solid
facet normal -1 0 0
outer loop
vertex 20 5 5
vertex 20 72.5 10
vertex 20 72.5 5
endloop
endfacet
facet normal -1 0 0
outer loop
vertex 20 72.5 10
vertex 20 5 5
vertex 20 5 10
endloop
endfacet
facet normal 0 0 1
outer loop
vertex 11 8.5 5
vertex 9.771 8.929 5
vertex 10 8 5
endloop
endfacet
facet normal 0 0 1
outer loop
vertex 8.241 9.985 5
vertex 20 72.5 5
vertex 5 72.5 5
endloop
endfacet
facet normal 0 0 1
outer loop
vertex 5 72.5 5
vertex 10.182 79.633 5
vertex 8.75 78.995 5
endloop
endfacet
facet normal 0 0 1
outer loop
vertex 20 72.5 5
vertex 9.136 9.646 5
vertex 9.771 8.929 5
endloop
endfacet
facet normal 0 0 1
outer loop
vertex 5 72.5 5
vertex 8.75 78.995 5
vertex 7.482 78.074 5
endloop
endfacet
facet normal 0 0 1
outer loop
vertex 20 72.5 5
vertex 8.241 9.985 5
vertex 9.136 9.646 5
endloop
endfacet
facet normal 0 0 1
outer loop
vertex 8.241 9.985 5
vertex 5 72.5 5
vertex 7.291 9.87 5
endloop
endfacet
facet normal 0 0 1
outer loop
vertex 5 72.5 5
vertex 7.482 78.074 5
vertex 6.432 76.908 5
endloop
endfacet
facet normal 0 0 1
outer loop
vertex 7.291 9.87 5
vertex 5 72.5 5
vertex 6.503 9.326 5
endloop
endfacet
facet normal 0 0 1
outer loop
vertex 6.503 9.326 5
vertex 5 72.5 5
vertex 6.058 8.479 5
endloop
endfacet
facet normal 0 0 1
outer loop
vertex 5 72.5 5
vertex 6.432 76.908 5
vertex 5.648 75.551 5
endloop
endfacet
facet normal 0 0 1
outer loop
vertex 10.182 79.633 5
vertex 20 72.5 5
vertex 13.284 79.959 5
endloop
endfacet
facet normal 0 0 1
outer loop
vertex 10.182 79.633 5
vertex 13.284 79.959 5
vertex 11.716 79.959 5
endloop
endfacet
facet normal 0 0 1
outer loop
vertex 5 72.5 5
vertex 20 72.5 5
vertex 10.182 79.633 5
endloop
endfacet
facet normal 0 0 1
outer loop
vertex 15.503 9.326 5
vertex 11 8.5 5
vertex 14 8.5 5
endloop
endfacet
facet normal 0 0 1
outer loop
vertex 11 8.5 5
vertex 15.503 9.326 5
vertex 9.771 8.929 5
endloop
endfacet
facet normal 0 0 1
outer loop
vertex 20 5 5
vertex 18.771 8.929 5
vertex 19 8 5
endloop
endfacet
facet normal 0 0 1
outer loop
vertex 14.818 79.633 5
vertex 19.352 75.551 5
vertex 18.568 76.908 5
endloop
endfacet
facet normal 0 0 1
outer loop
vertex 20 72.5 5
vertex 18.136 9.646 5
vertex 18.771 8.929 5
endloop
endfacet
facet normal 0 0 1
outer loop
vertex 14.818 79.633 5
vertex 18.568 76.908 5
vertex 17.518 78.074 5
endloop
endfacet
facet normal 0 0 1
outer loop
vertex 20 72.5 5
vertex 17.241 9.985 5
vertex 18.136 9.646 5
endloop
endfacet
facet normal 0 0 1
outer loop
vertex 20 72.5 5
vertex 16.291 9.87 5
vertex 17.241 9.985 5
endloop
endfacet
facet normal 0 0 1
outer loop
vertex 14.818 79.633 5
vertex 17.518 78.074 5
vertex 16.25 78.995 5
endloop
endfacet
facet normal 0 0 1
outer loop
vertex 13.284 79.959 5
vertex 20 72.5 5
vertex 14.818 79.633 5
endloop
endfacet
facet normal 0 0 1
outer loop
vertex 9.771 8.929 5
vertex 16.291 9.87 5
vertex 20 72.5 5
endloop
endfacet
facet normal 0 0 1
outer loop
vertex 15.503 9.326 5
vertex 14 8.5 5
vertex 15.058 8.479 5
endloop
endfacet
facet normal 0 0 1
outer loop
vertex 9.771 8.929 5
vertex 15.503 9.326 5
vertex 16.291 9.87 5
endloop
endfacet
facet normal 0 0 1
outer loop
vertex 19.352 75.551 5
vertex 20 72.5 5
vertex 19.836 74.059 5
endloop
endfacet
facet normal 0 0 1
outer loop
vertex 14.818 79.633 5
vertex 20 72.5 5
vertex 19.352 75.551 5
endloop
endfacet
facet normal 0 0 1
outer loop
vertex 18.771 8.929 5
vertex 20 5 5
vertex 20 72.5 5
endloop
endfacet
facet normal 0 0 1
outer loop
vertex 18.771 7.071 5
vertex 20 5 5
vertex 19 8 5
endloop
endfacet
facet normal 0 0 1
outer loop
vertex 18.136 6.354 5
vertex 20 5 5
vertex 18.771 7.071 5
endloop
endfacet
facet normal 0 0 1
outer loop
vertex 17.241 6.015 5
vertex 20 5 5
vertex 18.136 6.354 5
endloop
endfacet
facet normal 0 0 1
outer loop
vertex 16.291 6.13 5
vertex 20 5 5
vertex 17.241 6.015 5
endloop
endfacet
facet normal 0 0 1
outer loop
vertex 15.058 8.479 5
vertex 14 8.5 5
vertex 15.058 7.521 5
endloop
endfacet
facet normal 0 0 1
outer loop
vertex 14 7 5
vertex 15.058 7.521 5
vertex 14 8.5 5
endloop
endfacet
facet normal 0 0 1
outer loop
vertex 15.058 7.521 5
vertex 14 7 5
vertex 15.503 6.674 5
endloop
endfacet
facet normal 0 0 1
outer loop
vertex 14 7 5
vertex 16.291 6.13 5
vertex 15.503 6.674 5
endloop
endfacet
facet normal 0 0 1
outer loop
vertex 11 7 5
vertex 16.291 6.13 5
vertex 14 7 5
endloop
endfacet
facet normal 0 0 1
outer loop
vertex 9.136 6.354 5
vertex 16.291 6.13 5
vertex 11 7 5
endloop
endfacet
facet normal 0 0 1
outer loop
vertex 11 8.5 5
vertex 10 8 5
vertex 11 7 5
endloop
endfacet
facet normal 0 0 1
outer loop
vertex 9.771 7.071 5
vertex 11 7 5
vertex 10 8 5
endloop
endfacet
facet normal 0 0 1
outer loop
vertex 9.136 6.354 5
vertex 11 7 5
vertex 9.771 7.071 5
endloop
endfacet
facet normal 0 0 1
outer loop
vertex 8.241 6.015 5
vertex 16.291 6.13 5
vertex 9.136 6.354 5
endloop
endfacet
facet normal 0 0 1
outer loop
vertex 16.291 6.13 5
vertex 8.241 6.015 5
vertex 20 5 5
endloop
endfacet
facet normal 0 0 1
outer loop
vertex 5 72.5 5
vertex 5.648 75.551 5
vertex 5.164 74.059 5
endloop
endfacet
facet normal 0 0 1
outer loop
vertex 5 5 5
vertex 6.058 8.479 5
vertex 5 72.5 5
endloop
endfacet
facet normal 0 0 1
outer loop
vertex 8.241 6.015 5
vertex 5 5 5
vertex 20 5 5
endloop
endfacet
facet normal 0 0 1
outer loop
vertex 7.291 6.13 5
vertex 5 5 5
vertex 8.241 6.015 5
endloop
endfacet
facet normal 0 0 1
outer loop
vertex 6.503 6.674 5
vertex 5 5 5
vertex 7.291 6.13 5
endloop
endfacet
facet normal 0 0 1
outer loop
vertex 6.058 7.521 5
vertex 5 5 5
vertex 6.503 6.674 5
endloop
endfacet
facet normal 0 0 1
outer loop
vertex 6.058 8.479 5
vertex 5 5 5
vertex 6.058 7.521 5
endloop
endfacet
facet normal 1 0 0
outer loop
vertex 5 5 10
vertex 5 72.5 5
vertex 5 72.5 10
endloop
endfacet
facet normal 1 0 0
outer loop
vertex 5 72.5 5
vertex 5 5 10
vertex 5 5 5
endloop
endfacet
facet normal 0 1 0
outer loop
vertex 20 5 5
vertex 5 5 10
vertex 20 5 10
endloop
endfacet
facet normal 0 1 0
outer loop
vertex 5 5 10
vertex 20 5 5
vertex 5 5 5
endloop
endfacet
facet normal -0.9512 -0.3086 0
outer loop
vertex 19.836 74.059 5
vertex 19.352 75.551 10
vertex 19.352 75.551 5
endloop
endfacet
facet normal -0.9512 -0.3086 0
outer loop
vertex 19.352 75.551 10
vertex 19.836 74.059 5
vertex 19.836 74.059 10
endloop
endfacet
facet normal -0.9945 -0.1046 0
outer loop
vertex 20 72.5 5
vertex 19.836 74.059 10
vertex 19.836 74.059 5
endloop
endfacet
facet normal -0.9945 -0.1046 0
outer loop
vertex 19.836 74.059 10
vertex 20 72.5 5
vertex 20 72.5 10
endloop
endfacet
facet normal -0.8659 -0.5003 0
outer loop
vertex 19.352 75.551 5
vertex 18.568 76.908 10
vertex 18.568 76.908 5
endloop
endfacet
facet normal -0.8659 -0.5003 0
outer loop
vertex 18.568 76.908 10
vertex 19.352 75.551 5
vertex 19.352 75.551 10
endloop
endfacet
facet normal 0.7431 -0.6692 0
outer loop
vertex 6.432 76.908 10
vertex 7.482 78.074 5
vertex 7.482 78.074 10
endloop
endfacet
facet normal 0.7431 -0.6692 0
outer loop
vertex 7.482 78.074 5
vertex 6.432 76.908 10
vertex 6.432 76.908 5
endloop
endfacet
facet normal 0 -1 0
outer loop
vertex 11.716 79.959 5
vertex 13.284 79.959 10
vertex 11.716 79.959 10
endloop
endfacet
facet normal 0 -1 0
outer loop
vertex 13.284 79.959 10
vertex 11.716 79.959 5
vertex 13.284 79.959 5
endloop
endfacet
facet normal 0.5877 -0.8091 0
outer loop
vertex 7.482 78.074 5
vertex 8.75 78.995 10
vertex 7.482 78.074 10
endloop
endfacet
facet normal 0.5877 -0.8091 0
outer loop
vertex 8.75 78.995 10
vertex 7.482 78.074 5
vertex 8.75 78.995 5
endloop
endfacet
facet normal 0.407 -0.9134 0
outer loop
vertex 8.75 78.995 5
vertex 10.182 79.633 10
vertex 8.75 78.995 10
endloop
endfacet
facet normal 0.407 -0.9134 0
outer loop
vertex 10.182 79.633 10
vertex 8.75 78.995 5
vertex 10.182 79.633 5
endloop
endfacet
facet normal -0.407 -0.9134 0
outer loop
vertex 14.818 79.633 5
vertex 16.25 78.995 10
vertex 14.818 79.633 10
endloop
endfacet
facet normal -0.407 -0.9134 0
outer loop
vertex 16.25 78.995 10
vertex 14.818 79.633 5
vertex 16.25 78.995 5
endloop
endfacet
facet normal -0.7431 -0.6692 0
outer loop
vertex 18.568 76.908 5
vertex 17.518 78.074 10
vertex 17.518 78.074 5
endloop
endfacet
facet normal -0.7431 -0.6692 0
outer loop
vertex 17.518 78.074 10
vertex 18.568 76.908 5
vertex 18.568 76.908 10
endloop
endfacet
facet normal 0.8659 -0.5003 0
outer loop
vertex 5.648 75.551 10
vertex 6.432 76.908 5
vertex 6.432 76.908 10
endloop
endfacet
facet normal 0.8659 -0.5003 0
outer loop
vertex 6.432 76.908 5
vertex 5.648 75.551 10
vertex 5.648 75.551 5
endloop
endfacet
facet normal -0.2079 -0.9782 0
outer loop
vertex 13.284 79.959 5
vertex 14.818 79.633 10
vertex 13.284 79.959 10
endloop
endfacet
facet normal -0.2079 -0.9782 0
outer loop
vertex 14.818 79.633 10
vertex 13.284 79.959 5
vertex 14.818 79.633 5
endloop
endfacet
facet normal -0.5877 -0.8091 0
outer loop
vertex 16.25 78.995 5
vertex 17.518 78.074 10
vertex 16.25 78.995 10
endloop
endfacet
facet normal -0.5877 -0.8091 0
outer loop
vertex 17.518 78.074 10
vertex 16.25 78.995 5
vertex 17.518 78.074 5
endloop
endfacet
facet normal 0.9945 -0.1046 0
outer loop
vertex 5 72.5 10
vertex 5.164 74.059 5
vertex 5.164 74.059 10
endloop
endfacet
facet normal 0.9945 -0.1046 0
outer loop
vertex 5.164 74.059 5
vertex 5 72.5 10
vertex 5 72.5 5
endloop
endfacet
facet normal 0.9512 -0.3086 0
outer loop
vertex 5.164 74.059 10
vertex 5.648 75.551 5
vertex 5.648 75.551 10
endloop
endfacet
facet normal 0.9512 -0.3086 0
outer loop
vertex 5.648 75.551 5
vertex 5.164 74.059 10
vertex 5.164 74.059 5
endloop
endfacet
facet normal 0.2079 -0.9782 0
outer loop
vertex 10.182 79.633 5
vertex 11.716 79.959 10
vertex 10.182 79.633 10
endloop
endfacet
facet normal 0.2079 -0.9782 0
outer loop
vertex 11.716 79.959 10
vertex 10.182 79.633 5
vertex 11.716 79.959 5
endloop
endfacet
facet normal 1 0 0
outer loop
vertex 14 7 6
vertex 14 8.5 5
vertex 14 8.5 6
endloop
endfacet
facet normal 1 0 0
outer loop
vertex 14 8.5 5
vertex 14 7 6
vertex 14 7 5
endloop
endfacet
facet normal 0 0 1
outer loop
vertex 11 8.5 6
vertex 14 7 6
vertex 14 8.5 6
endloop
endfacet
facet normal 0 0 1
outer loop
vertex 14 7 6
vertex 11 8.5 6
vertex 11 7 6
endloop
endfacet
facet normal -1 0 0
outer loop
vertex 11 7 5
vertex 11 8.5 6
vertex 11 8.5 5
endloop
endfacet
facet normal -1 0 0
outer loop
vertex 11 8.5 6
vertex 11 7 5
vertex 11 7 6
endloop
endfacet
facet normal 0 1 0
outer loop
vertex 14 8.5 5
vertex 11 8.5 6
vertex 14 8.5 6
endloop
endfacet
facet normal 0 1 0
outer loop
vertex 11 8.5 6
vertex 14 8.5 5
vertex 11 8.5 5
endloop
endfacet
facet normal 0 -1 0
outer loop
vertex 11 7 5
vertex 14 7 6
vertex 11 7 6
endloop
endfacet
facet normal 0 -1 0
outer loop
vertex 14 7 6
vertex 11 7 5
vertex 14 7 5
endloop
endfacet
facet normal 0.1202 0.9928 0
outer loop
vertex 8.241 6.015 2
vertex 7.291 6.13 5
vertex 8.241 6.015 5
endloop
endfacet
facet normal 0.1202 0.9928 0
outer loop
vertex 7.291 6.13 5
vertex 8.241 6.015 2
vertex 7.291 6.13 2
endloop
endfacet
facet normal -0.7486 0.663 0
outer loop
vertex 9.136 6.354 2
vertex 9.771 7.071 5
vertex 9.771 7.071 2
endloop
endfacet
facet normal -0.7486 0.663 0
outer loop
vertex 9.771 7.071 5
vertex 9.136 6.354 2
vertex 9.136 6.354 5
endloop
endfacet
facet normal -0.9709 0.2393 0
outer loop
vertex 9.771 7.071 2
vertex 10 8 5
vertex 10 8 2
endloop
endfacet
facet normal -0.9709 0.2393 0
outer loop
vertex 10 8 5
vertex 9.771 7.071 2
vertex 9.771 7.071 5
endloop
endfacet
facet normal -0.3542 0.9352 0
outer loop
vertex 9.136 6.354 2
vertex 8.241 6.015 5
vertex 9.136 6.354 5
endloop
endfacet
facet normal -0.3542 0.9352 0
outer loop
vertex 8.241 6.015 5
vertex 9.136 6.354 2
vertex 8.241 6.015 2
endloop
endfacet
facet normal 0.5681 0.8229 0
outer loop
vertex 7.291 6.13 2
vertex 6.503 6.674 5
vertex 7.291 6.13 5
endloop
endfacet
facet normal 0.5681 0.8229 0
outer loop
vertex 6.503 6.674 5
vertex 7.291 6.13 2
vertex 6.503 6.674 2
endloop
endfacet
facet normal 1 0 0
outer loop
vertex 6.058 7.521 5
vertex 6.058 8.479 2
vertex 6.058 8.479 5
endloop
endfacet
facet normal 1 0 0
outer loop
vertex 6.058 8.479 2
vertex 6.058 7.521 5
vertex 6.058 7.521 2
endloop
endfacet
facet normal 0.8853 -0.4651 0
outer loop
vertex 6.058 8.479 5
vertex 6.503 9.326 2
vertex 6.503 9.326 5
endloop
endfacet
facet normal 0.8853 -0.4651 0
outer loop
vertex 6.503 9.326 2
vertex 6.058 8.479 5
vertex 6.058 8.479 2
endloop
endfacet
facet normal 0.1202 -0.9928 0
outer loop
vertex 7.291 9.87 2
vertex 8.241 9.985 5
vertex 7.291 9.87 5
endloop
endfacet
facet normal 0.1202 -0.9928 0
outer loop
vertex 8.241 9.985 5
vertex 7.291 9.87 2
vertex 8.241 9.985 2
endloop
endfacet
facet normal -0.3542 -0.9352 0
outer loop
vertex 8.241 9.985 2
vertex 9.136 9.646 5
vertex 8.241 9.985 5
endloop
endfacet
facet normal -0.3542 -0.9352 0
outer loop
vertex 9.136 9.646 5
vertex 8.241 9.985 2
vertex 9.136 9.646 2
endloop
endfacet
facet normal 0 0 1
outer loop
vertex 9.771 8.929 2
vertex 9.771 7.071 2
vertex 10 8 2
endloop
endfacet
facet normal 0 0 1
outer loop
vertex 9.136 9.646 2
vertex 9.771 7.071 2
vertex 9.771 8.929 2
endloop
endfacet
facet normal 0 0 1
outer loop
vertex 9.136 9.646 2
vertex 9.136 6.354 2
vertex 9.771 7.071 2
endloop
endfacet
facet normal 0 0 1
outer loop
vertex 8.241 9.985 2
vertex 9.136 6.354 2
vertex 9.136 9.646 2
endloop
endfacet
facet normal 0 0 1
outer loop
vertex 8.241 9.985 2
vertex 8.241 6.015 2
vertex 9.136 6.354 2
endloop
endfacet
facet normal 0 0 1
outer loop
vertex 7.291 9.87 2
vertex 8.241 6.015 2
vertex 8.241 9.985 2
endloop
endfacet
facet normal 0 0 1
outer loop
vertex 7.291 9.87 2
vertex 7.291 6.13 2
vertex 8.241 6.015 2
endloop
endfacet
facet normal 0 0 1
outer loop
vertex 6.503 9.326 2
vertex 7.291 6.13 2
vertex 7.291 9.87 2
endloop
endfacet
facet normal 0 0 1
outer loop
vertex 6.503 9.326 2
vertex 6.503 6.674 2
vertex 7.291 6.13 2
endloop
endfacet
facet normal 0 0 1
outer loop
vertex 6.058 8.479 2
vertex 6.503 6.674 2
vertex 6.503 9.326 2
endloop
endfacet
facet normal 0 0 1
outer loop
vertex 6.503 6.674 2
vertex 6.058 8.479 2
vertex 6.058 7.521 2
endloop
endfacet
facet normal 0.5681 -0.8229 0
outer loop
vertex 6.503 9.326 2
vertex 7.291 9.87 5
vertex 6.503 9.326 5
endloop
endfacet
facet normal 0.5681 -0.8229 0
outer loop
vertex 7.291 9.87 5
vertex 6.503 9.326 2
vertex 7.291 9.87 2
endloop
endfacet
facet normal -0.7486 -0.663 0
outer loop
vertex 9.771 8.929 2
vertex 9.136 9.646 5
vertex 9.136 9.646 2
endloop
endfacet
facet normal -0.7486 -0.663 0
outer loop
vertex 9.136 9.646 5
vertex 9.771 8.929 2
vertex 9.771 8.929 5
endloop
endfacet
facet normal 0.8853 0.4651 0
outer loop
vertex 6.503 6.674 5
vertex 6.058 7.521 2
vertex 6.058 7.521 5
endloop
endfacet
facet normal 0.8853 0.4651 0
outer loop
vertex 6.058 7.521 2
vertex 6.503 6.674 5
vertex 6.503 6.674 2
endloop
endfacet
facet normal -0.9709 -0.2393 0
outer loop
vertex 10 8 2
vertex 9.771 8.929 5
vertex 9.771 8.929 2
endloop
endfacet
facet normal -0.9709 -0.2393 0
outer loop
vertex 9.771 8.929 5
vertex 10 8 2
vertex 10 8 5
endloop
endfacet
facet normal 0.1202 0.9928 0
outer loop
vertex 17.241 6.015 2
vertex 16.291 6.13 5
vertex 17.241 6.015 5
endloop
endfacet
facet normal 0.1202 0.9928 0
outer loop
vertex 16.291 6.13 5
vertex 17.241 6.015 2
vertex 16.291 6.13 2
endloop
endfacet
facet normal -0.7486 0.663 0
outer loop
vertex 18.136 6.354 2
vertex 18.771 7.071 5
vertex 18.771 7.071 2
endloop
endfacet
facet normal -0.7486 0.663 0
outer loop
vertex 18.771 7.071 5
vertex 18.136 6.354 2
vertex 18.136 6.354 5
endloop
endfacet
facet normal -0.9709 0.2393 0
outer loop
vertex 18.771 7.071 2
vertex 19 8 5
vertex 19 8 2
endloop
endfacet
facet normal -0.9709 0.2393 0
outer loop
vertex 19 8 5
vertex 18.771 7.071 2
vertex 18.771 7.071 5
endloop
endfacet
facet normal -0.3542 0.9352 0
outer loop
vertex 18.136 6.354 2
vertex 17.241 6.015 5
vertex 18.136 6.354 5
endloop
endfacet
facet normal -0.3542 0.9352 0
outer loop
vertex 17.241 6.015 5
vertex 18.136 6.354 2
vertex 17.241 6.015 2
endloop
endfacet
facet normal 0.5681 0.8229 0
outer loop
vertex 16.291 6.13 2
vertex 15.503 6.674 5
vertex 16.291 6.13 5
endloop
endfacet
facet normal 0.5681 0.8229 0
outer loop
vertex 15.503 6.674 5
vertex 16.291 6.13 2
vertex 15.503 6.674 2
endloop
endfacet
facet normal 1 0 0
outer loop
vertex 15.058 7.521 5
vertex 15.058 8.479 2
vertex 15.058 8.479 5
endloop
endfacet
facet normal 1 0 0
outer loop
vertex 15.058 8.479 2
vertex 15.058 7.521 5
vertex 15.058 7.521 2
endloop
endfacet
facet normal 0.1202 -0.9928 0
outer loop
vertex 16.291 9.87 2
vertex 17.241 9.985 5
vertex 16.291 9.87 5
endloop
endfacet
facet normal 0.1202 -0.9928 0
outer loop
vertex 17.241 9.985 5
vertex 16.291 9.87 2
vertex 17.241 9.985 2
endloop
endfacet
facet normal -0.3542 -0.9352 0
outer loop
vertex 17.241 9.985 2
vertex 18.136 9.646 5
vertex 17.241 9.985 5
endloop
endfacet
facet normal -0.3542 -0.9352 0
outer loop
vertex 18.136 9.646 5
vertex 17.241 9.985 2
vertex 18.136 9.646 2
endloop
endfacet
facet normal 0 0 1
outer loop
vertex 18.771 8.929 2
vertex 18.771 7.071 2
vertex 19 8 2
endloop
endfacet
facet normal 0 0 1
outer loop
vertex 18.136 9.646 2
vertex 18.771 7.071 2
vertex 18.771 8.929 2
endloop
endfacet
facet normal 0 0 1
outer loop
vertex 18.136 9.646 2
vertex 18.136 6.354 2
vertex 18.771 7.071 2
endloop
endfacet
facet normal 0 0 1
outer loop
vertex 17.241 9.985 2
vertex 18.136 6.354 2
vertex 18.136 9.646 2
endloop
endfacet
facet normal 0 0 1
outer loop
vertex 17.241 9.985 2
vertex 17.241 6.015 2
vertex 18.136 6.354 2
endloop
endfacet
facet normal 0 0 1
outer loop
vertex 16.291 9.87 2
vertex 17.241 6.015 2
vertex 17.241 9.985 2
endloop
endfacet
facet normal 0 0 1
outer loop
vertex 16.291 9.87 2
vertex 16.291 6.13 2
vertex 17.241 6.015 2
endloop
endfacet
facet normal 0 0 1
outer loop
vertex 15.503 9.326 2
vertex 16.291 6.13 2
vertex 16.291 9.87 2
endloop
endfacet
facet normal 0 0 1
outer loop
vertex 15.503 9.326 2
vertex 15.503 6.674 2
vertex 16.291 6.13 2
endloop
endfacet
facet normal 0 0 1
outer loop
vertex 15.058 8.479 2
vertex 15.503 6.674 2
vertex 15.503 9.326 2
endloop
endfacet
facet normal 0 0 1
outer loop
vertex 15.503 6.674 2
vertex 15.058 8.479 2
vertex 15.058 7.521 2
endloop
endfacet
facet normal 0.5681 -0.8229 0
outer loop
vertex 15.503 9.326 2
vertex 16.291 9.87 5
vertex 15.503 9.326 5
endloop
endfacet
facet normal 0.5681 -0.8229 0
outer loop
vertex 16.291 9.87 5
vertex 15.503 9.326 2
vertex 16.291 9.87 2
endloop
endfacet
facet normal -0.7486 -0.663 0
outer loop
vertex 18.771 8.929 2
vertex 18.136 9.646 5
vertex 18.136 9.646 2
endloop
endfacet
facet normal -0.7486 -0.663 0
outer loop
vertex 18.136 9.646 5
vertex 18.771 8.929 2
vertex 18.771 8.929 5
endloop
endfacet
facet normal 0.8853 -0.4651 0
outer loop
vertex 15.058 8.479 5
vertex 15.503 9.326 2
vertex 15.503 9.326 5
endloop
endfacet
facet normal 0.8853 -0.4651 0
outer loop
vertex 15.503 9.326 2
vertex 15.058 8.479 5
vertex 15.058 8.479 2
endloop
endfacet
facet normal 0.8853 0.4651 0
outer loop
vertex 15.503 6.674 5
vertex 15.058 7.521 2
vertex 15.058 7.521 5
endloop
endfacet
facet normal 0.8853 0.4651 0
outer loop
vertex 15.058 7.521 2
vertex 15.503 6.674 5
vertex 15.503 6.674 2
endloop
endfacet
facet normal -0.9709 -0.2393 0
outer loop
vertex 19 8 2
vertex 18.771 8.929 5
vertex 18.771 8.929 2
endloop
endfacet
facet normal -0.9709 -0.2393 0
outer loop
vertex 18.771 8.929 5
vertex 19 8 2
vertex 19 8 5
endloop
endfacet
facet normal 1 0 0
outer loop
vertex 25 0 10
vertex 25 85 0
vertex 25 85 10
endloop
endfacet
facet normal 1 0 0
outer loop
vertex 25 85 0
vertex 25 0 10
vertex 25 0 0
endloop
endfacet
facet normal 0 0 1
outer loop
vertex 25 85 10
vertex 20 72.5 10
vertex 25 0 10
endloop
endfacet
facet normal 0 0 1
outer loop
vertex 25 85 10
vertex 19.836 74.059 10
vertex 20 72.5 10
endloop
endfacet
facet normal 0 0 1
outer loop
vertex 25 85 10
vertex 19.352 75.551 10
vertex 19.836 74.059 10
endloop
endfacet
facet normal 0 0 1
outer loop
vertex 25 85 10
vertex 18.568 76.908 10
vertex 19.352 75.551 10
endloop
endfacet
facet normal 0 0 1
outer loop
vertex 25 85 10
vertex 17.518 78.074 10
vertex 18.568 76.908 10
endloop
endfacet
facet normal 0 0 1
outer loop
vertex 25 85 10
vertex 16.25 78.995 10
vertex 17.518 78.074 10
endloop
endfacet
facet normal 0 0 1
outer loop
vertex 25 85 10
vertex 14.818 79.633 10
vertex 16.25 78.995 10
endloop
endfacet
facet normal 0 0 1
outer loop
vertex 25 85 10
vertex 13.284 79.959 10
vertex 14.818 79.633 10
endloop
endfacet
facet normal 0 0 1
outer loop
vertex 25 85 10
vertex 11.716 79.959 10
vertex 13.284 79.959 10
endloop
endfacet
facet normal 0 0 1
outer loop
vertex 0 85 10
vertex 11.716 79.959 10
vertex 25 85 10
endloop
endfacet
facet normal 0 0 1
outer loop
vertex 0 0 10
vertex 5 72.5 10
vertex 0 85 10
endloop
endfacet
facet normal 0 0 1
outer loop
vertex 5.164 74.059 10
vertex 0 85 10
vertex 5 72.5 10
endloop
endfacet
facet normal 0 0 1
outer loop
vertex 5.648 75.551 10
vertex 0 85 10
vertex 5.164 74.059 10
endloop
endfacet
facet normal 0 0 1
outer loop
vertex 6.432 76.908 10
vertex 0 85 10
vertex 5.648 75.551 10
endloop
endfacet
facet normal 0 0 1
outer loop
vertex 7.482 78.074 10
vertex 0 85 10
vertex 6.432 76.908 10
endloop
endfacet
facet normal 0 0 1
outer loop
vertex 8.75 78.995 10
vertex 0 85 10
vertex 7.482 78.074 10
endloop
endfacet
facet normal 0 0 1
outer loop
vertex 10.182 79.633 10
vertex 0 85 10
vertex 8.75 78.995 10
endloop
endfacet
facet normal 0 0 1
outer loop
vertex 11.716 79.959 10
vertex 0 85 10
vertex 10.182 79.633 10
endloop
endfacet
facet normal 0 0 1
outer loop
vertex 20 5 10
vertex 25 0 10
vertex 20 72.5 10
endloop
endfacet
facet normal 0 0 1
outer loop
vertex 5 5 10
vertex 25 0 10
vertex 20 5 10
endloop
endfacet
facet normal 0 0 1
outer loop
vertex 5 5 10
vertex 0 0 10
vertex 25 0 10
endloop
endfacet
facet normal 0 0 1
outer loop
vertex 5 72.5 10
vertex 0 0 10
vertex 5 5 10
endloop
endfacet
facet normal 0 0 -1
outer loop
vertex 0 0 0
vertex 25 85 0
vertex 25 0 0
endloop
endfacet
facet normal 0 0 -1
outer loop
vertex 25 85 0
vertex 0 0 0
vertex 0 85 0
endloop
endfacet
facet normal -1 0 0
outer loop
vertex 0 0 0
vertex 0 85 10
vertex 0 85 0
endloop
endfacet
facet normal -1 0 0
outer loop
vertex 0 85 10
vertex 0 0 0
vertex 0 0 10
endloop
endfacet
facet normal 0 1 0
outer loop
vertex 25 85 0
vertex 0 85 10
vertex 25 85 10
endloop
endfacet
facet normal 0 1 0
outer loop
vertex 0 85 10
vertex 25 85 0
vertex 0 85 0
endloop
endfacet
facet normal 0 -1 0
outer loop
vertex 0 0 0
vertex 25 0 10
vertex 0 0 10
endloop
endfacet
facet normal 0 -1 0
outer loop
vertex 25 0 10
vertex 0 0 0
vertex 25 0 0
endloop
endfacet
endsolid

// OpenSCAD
// file: hair.scad
// Single hair.

// Precision for rounded stuff.
$fs = 1;

// Constants:
//
// Units are in mm.

HAIR_WIDTH = 15;
HAIR_LENGTH = 75;
HAIR_DEPTH = 2;

PILLAR_DIAMETER = 2;
// How long the pillars extend below the surface.
PILLAR_DEPTH = 3;
// Offset to center from the top (width) edge.
PILLAR_OFFSET_TOP = 3;
// Offset to center from the side (length) edge.
PILLAR_OFFSET_SIDE = 3;

// For now, LEDs are just rectangles.
// TODO: make them be rectangle + half-circle shaped.
LED_WIDTH = 3;
LED_LENGTH = 1.5;
LED_DEPTH = 1;
// Offset from the "top" edge.
LED_OFFSET = 2;

// Rounded rectangle base.
module Structure() {
  cube(size=[HAIR_WIDTH, HAIR_LENGTH - HAIR_WIDTH / 2, HAIR_DEPTH]);
  // Rounded end.
  translate([HAIR_WIDTH / 2, HAIR_LENGTH - HAIR_WIDTH / 2, 0])
    cylinder(h=HAIR_DEPTH, r=HAIR_WIDTH/2);
}

// LED shape, used for subtracting.
module Led() {
  // Go a small delta below the surface to make difference work cleanly.
  translate([(HAIR_WIDTH - LED_WIDTH) / 2, LED_OFFSET, -0.1])
    cube(size=[LED_WIDTH, LED_LENGTH, LED_DEPTH + 0.1]);
}

// Two pillars, extending in the negative Z direction.
module Pillars() {
  for (x = [PILLAR_OFFSET_SIDE, HAIR_WIDTH - PILLAR_OFFSET_SIDE]) {
    // Small offset in Z to make unions work cleanly.
    translate([x, PILLAR_OFFSET_TOP, 0.1])
      rotate([180, 0, 0])
        cylinder(h=(PILLAR_DEPTH + 0.1), r=PILLAR_DIAMETER);
  }
}

// Draws a single hair with pillars and LED hole.
module Hair() {
  difference() {
    Structure();
    Led();
  }
  Pillars();
}

Hair();
// main file
// 3D-printable mold for casting a single hair.

// Precision for rounded stuff.
$fs = 1;

use <hair.scad>;

// Constants:
//
// Units are in mm.

MOLD_WALLS = 5;
MOLD_WIDTH = 15 + 2 * MOLD_WALLS;
MOLD_LENGTH = 75 + 2 * MOLD_WALLS;
MOLD_Z_OFFSET = 5;
MOLD_DEPTH = 10;

module Mold() {
  difference() {
    cube(size=[MOLD_WIDTH, MOLD_LENGTH, MOLD_DEPTH]);
    render()
    union() {
      // TODO: this for loop is a hack. I couldn't quickly figure out how to
      // get a profile and extrude it to make the top open for the mold.
      for (i = [0 : MOLD_DEPTH]) {
        translate([MOLD_WALLS, MOLD_WALLS, MOLD_Z_OFFSET + i])
          Hair();
      }
    }
  }
}

Mold();
